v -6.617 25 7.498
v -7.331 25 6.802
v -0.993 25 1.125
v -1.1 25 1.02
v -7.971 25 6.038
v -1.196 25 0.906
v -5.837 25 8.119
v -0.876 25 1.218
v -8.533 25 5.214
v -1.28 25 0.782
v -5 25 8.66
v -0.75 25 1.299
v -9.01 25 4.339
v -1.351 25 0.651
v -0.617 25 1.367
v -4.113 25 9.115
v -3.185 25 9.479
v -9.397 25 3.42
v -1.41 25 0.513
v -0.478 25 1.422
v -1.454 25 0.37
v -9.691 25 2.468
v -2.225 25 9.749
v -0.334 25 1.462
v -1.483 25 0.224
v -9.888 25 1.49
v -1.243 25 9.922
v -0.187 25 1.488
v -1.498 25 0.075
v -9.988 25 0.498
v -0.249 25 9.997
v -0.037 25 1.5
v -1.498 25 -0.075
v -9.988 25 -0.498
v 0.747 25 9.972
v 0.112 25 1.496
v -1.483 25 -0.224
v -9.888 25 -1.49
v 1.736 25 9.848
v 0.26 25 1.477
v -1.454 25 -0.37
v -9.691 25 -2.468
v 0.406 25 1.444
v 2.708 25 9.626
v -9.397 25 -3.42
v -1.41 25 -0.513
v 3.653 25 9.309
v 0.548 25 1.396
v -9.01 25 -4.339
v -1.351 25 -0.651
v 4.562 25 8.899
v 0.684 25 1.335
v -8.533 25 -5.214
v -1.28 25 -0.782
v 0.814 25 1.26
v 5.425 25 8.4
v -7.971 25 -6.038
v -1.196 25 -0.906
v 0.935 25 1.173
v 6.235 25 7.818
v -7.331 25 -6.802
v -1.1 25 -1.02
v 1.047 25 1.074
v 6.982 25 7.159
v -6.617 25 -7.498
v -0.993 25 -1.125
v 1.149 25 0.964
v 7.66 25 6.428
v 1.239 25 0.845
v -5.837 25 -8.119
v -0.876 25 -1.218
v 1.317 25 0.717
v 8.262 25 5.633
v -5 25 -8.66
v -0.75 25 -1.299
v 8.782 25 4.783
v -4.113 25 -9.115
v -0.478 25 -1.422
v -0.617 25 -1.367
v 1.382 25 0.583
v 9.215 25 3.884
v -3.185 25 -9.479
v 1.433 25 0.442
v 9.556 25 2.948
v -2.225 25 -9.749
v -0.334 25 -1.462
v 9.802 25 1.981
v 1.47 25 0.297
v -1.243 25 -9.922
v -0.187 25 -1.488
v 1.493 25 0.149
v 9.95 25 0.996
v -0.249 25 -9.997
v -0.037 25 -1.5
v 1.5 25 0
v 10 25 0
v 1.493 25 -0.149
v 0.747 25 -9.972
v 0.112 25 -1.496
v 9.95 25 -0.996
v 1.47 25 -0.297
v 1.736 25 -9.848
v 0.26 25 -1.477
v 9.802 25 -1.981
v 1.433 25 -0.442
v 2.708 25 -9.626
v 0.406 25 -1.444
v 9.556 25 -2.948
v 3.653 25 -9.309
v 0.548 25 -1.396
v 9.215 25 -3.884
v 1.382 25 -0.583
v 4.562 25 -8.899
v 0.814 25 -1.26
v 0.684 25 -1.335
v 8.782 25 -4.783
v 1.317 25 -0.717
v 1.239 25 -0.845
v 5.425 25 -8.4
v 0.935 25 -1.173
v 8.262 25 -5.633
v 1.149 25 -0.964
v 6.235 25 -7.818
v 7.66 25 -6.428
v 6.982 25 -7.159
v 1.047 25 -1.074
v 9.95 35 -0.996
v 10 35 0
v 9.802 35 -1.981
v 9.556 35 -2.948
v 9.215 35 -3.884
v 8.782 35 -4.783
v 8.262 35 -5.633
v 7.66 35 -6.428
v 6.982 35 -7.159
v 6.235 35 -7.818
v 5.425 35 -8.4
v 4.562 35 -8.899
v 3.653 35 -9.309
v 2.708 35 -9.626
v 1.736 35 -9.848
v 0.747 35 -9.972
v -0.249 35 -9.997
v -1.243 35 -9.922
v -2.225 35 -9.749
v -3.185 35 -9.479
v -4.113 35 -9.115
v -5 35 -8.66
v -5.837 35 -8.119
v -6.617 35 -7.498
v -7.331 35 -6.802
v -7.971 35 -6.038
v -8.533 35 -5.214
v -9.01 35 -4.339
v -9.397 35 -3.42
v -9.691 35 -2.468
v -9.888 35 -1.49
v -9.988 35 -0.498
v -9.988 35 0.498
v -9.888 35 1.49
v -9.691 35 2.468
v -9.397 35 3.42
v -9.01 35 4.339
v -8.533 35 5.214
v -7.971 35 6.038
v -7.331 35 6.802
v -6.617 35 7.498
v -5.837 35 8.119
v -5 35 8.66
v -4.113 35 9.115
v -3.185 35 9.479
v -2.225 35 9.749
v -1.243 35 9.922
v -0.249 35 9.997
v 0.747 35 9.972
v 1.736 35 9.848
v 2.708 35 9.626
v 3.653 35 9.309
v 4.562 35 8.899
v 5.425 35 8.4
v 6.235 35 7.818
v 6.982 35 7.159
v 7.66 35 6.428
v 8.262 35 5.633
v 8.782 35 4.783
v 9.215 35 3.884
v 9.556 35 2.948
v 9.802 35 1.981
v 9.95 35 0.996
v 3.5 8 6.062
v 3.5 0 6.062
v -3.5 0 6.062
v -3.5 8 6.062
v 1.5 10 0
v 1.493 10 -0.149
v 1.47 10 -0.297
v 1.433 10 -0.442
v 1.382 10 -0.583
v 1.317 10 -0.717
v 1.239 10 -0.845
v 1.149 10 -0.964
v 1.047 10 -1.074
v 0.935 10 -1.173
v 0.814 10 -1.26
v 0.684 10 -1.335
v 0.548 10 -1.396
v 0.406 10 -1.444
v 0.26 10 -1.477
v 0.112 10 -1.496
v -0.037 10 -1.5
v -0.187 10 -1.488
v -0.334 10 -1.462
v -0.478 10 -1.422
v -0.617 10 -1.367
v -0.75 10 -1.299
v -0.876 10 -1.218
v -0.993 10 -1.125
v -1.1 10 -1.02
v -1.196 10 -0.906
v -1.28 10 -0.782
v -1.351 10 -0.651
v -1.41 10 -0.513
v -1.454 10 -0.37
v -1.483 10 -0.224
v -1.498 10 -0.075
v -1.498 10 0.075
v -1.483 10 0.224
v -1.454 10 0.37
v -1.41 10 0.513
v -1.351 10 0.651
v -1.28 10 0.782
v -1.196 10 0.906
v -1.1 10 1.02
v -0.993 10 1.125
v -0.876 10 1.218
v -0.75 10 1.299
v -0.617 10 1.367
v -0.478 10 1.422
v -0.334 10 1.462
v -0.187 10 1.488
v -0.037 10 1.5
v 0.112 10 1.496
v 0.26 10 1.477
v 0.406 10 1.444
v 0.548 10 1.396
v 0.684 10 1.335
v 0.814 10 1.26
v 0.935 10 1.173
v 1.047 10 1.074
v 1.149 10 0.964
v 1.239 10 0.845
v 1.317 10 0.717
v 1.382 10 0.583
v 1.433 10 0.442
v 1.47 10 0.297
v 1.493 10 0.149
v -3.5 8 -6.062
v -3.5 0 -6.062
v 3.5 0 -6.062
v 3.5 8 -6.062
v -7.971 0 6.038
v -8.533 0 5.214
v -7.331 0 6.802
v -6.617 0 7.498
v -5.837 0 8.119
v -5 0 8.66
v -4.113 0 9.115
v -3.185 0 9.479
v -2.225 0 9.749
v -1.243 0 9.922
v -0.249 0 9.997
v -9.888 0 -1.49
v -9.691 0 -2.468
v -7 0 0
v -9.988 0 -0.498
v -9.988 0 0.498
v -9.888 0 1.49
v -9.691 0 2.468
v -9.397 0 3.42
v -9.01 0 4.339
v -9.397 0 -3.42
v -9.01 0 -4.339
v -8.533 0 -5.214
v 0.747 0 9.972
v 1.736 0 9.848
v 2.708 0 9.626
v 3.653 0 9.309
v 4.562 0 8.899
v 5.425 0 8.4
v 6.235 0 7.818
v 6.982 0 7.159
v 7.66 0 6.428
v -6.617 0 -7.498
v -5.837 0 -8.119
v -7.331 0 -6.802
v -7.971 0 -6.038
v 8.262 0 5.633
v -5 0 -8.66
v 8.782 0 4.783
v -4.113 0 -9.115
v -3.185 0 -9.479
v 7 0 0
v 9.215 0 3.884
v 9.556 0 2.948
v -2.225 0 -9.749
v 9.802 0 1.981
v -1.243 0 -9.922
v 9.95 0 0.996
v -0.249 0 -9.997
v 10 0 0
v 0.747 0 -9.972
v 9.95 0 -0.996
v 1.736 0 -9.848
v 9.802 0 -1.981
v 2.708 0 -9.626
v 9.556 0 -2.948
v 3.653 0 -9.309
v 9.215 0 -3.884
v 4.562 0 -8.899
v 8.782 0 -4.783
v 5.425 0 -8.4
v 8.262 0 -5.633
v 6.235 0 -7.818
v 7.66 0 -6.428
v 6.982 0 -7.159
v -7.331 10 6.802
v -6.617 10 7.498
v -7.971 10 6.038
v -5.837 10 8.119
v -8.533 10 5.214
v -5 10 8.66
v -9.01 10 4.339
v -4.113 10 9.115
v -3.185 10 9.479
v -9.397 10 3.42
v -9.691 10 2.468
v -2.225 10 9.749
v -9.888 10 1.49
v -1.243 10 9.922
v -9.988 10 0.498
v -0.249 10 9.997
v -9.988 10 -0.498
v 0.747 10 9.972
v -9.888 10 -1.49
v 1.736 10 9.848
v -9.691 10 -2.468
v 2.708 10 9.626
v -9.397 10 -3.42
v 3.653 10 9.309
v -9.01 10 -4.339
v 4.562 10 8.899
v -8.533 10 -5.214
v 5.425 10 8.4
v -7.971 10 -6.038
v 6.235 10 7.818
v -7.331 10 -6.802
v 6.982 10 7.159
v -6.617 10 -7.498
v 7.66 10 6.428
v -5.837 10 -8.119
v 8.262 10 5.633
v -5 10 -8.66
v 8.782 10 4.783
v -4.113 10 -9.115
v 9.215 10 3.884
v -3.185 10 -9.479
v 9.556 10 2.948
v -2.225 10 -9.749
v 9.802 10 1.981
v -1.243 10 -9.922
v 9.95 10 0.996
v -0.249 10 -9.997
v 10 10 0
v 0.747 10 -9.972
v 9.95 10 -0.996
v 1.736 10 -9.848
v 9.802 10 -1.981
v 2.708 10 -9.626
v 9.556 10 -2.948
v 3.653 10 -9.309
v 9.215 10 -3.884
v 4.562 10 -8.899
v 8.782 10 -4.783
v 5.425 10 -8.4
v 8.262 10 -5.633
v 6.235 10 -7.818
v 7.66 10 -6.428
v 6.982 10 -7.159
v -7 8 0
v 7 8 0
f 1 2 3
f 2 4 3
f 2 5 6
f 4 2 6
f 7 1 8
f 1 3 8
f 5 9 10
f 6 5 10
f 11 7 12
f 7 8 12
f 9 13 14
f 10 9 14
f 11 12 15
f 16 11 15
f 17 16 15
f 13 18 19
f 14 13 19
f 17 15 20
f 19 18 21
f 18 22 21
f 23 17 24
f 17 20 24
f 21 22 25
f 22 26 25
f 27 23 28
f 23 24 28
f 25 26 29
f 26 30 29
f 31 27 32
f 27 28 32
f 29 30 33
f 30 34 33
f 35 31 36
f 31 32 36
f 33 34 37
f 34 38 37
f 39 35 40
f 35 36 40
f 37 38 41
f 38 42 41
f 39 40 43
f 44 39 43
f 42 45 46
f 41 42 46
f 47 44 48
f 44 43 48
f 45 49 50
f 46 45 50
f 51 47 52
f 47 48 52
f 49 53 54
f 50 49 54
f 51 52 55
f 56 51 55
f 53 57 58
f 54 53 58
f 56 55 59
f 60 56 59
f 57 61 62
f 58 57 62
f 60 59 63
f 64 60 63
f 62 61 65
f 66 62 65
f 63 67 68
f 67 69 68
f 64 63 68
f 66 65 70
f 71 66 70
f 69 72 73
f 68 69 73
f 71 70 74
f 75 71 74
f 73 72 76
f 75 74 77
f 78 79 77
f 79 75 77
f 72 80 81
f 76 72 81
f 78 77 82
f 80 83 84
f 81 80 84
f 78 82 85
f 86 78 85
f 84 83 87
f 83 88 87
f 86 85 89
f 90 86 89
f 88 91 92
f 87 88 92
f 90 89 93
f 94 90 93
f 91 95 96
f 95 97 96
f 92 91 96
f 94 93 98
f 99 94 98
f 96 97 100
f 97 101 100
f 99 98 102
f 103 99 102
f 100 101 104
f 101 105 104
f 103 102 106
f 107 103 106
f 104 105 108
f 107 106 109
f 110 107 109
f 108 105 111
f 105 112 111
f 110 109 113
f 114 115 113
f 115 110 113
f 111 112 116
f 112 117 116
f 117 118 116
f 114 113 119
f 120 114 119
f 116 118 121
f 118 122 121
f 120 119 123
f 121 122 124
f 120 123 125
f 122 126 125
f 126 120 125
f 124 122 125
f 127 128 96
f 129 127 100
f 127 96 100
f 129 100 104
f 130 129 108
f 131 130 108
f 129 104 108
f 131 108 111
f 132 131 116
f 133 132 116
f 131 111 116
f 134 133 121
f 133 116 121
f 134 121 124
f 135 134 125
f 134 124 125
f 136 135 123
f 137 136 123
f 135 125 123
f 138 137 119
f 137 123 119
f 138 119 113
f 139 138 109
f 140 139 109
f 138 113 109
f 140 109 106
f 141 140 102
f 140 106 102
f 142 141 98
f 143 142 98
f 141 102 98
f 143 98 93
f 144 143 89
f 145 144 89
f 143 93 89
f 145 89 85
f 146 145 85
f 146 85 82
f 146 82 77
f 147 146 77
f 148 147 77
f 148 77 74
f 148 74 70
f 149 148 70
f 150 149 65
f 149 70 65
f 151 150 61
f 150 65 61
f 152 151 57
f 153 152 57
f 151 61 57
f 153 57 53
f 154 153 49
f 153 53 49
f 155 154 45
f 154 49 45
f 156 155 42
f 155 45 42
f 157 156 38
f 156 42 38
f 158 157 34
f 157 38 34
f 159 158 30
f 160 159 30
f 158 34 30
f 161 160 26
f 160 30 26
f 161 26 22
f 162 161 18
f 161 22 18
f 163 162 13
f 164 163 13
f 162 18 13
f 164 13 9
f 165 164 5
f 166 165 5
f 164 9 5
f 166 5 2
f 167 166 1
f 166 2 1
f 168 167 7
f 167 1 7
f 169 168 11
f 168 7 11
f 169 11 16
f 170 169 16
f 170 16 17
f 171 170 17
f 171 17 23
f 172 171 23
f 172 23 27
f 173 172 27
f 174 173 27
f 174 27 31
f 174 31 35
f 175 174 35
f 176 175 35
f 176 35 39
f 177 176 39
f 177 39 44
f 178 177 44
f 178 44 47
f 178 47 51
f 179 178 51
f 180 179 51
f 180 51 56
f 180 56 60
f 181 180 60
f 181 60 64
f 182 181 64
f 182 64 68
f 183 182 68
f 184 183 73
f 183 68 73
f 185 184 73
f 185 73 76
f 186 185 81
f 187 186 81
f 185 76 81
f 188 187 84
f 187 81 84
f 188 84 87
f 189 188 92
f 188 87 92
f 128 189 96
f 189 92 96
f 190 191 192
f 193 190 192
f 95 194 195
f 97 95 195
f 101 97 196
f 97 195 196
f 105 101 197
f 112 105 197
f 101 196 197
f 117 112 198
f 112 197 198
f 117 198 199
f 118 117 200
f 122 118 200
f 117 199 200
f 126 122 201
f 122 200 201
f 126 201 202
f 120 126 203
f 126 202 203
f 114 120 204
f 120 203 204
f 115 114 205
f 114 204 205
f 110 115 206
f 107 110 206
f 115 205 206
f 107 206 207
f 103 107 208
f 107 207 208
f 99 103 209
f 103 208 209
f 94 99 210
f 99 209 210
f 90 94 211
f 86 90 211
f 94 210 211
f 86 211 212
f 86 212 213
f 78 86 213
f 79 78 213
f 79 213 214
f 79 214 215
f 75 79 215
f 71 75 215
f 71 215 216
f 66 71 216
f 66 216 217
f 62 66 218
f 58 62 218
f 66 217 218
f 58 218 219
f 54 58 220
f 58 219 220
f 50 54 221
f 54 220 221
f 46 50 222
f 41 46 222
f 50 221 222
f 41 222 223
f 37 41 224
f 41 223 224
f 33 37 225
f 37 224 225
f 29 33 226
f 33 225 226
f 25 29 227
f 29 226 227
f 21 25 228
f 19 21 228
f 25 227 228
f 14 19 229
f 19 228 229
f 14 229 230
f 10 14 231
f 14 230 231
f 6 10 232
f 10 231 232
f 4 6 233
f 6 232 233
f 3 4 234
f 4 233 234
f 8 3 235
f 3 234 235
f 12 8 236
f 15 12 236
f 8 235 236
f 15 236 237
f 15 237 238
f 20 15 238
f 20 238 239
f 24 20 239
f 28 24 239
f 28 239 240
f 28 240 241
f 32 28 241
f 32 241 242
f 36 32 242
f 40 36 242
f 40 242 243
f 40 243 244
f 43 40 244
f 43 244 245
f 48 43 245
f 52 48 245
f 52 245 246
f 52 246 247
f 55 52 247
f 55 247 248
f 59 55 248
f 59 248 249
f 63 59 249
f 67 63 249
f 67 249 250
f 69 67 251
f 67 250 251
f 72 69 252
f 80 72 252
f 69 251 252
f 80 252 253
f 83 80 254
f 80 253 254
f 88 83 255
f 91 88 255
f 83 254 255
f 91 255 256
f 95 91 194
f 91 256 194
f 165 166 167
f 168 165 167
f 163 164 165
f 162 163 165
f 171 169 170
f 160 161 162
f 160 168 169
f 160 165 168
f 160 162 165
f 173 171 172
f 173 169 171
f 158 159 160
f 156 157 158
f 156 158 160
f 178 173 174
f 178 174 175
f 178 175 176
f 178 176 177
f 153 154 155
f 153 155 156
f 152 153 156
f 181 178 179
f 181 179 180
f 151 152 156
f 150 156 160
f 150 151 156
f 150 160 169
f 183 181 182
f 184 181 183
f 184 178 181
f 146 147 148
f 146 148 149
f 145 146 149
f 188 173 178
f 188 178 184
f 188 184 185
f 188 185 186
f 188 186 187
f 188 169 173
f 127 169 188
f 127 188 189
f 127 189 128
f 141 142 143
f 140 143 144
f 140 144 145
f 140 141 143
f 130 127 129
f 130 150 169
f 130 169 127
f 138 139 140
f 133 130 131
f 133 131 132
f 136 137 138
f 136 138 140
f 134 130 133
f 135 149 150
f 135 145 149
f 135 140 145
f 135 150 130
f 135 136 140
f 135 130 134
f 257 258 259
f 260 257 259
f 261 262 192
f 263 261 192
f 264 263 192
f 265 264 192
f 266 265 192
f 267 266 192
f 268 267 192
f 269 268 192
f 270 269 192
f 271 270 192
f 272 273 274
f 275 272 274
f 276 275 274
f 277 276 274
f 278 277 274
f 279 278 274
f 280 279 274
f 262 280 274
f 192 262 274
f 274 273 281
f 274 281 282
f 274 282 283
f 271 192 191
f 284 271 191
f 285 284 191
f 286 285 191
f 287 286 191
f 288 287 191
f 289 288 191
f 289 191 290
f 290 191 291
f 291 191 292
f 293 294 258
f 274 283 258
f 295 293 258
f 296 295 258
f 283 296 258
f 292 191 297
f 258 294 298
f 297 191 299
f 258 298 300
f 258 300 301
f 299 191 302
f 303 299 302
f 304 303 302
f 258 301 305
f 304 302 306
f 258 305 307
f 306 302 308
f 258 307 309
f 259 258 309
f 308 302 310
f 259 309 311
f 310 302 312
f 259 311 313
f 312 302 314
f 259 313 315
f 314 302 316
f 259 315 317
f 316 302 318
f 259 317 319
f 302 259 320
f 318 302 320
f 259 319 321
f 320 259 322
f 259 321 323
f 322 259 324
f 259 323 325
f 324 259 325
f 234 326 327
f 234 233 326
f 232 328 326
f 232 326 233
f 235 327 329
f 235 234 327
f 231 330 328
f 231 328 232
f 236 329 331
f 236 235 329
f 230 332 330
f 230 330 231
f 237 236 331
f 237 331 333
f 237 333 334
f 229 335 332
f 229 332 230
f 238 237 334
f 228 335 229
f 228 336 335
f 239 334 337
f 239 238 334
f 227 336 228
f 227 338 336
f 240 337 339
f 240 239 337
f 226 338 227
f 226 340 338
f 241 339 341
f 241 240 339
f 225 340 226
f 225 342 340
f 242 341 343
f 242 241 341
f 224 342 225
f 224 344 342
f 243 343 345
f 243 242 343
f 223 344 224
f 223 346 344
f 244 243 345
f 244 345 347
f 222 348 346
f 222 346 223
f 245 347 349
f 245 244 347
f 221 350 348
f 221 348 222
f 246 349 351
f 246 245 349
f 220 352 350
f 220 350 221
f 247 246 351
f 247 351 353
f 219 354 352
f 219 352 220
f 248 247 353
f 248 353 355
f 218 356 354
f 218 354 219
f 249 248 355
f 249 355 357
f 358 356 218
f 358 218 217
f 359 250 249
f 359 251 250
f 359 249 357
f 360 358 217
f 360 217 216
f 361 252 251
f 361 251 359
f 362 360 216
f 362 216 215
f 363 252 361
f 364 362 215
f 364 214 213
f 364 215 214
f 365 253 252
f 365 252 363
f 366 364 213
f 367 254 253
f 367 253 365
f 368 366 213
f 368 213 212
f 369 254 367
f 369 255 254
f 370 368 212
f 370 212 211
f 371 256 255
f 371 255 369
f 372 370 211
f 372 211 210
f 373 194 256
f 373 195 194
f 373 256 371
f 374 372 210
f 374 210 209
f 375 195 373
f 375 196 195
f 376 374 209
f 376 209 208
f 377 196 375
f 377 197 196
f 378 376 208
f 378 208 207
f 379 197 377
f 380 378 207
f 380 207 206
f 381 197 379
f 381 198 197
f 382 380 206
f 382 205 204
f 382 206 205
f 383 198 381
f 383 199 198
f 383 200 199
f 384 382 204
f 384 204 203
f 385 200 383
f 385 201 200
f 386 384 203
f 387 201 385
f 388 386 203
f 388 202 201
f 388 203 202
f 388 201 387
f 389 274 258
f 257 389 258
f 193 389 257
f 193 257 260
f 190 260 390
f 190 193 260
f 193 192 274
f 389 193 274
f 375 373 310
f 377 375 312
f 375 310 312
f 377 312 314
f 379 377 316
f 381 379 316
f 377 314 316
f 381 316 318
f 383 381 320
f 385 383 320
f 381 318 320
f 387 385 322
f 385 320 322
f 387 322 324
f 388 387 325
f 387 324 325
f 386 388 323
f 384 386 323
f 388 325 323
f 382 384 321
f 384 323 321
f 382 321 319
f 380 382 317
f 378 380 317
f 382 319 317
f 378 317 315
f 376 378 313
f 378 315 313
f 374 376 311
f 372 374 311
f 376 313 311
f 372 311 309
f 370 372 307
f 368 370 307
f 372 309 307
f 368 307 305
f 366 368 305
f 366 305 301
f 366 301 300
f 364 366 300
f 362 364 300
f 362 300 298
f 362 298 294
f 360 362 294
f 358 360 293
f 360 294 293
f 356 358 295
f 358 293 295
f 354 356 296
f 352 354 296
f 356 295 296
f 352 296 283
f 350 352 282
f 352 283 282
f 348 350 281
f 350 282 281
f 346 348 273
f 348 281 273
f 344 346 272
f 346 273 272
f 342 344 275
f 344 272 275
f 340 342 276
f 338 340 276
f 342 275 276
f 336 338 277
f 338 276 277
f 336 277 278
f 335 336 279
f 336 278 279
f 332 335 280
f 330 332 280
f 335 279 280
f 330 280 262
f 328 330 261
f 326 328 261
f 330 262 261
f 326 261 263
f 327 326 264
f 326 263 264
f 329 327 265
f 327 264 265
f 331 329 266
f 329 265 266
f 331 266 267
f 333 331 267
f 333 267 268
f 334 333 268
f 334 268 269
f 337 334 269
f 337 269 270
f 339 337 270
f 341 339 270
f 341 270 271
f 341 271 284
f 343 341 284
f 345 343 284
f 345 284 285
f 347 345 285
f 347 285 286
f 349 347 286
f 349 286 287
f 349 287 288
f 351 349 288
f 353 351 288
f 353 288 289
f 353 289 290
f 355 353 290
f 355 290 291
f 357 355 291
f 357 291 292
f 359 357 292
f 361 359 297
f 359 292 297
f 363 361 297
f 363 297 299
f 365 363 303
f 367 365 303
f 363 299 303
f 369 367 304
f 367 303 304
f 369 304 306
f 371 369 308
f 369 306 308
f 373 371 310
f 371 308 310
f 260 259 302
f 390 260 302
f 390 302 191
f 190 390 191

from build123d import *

# Parameters (mm, degrees)
SKETCH1_R           = 10
BOSS_EXTRUDE1_DEPTH = 10
SKETCH2_R           = 1.5
BOSS_EXTRUDE2_DEPTH = 15
CUT_EXTRUDE1_DEPTH  = 8
SKETCH4_R           = 10
BOSS_EXTRUDE3_DEPTH = 10


with BuildPart() as part:
    # Sketch1 → Boss-Extrude1 (new body)
    with BuildSketch(Plane(origin=(0, 0, 0), x_dir=(1, 0, 0), z_dir=(0, 1, 0))):
        Circle(SKETCH1_R)
    extrude(amount=BOSS_EXTRUDE1_DEPTH)

    # Sketch2 → Boss-Extrude2 (add)
    with BuildSketch(Plane(origin=(0, 10, 0), x_dir=(1, 0, 0), z_dir=(0, 1, 0))):
        Circle(SKETCH2_R)
    extrude(amount=BOSS_EXTRUDE2_DEPTH)

    # Sketch3 → Cut-Extrude1 (cut)
    with BuildSketch(Plane.XZ):
        Polygon((7, 0), (3.5, 6.062177826), (-3.5, 6.062177826), (-7, 0), (-3.5, -6.062177826), (3.5, -6.062177826), align=None)
    extrude(amount=-CUT_EXTRUDE1_DEPTH, mode=Mode.SUBTRACT)

    # Sketch4 → Boss-Extrude3 (add)
    with BuildSketch(Plane(origin=(0, 25, 0), x_dir=(1, 0, 0), z_dir=(0, 1, 0))):
        Circle(SKETCH4_R)
    extrude(amount=BOSS_EXTRUDE3_DEPTH)


solid = part.part
